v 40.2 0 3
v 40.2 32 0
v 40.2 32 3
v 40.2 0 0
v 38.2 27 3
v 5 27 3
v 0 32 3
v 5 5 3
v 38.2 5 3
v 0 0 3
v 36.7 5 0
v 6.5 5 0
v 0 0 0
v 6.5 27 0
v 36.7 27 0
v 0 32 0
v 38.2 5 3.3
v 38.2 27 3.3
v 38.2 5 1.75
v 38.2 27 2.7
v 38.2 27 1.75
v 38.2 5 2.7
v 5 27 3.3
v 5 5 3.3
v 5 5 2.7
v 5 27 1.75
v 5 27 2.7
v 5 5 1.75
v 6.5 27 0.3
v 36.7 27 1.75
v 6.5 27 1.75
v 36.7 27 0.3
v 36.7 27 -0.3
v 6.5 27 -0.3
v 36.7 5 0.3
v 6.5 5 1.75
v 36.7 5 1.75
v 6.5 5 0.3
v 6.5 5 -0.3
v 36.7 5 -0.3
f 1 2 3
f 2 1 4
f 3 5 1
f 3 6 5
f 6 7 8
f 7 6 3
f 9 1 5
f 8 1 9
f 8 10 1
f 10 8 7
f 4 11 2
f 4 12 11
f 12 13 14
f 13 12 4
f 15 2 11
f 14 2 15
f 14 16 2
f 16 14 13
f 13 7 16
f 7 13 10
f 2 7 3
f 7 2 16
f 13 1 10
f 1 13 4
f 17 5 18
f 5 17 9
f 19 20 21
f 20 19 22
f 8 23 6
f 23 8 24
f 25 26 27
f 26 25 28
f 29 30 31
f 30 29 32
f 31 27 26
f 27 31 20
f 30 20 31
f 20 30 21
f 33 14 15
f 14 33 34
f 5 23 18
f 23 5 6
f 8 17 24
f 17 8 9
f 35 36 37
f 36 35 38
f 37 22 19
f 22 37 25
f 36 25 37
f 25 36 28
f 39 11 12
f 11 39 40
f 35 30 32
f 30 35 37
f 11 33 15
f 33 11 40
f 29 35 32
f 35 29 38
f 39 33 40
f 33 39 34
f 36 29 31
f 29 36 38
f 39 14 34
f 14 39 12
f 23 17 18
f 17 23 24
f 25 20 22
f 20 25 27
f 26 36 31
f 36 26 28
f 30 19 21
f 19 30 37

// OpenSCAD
// LibFile: unfy_popins.scad
//   UnfyOpenSCADLib Copyright Leif Burrow 2026
//   kc8rwr@unfy.us
//   unforgettability.net
//   .
//   This file is part of UnfyOpenSCADLib.
//   .
//   unfy_popins contains modules for creating cutouts and mounts for simple rectangular parts such as switches and panel meters which push into a hole and have fingers that grab. Parts may be selected by name so that the end user may choose a part from a customizer drop-down.

use <../unfy_lists.scad>

//Device 
device="rleil_r2"; //["RLEIL_R2 | RLEIL_R2-Rleil R2 Series Switch", "YB4835VA | Digital Volt/Amp Panel Meter"]
wall = 3;
margin = 5;
support_skin = 0.6;

body_color = "Blue"; //["Lavender", "Thistle", "Plum", "Violet", "Orchid", "Fuchsia", "Magenta", "MediumOrchid", "MediumPurple", "BlueViolet", "DarkViolet", "DarkOrchid", "DarkMagenta", "Purple", "Indigo", "DarkSlateBlue", "SlateBlue", "MediumSlateBlue", "Pink", "LightPink", "HotPink", "DeepPink", "MediumVioletRed", "PaleVioletRed", "Aqua", "Cyan", "LightCyan", "PaleTurquoise", "Aquamarine", "Turquoise", "MediumTurquoise", "DarkTurquoise", "CadetBlue", "SteelBlue", "LightSteelBlue", "PowderBlue", "LightBlue", "SkyBlue", "LightSkyBlue", "DeepSkyBlue", "DodgerBlue", "CornflowerBlue", "RoyalBlue", "Blue", "MediumBlue", "DarkBlue", "Navy", "MidnightBlue", "IndianRed", "LightCoral", "Salmon", "DarkSalmon", "LightSalmon", "Red", "Crimson", "FireBrick", "DarkRed", "GreenYellow", "Chartreuse", "LawnGreen", "Lime", "LimeGreen", "PaleGreen", "LightGreen", "MediumSpringGreen", "SpringGreen", "MediumSeaGreen", "SeaGreen", "ForestGreen", "Green", "DarkGreen", "YellowGreen", "OliveDrab", "Olive", "DarkOliveGreen", "MediumAquamarine", "DarkSeaGreen", "LightSeaGreen", "DarkCyan", "Teal", "LightSalmon", "Coral", "Tomato", "OrangeRed", "DarkOrange", "Orange", "Gold", "Yellow", "LightYellow", "LemonChiffon", "LightGoldenrodYellow", "PapayaWhip", "Moccasin", "PeachPuff", "PaleGoldenrod", "Khaki", "DarkKhaki", "Cornsilk", "BlanchedAlmond", "Bisque", "NavajoWhite", "Wheat", "BurlyWood", "Tan", "RosyBrown", "SandyBrown", "Goldenrod", "DarkGoldenrod", "Peru", "Chocolate", "SaddleBrown", "Sienna", "Brown", "Maroon", "White", "Snow", "Honeydew", "MintCream", "Azure", "AliceBlue", "GhostWhite", "WhiteSmoke", "Seashell", "Beige", "OldLace", "FloralWhite", "Ivory", "AntiqueWhite", "Linen", "LavenderBlush", "MistyRose", "Gainsboro", "LightGrey", "Silver", "DarkGray", "Gray", "DimGray", "LightSlateGray", "SlateGray", "DarkSlateGray", "Black"]
support_color = "Yellow"; //["Lavender", "Thistle", "Plum", "Violet", "Orchid", "Fuchsia", "Magenta", "MediumOrchid", "MediumPurple", "BlueViolet", "DarkViolet", "DarkOrchid", "DarkMagenta", "Purple", "Indigo", "DarkSlateBlue", "SlateBlue", "MediumSlateBlue", "Pink", "LightPink", "HotPink", "DeepPink", "MediumVioletRed", "PaleVioletRed", "Aqua", "Cyan", "LightCyan", "PaleTurquoise", "Aquamarine", "Turquoise", "MediumTurquoise", "DarkTurquoise", "CadetBlue", "SteelBlue", "LightSteelBlue", "PowderBlue", "LightBlue", "SkyBlue", "LightSkyBlue", "DeepSkyBlue", "DodgerBlue", "CornflowerBlue", "RoyalBlue", "Blue", "MediumBlue", "DarkBlue", "Navy", "MidnightBlue", "IndianRed", "LightCoral", "Salmon", "DarkSalmon", "LightSalmon", "Red", "Crimson", "FireBrick", "DarkRed", "GreenYellow", "Chartreuse", "LawnGreen", "Lime", "LimeGreen", "PaleGreen", "LightGreen", "MediumSpringGreen", "SpringGreen", "MediumSeaGreen", "SeaGreen", "ForestGreen", "Green", "DarkGreen", "YellowGreen", "OliveDrab", "Olive", "DarkOliveGreen", "MediumAquamarine", "DarkSeaGreen", "LightSeaGreen", "DarkCyan", "Teal", "LightSalmon", "Coral", "Tomato", "OrangeRed", "DarkOrange", "Orange", "Gold", "Yellow", "LightYellow", "LemonChiffon", "LightGoldenrodYellow", "PapayaWhip", "Moccasin", "PeachPuff", "PaleGoldenrod", "Khaki", "DarkKhaki", "Cornsilk", "BlanchedAlmond", "Bisque", "NavajoWhite", "Wheat", "BurlyWood", "Tan", "RosyBrown", "SandyBrown", "Goldenrod", "DarkGoldenrod", "Peru", "Chocolate", "SaddleBrown", "Sienna", "Brown", "Maroon", "White", "Snow", "Honeydew", "MintCream", "Azure", "AliceBlue", "GhostWhite", "WhiteSmoke", "Seashell", "Beige", "OldLace", "FloralWhite", "Ivory", "AntiqueWhite", "Linen", "LavenderBlush", "MistyRose", "Gainsboro", "LightGrey", "Silver", "DarkGray", "Gray", "DimGray", "LightSlateGray", "SlateGray", "DarkSlateGray", "Black"]


$unf_over = 1;

// Section: Custom Pop-ins
//   Modules for pop-ins of any size. These are used by the named parts below, and may be used directly for parts which are not yet included.

// Module: unf_popinCustomNegative
// Usage:
//   unf_popinCustomNegative(&lt;args&gt;);
// Description:
//   The cutout for a pop-in part of any size. The cutout is the size of the opening plus the ridge on each side, it is partially filled back in by unf_popinCustomPositive().
// Arguments:
//   ---
//   size = [x, y] size of the opening the part pushes through ([10, 5])
//   ridge = [x, y] width of the ledge on each side of the opening which the part's fingers grab ([2, 1])
//   extra = how far beyond the wall to extend the cutout (5)
//   wall = thickness of the panel the part is mounted in (2)
// Figure(Spin;VPD=50;VPT=[7,3.5,3];NoAxes): defaults
//   $unf_over = 1;
//   $fn = 36;
//   use <cutouts/unfy_popins.scad>;
//   unf_popinCustomNegative();
module unf_popinCustomNegative(size=[10, 5], ridge=[2, 1], extra=5, wall=2){
  translate([0, 0, -$unf_over]){
    cube([size.x+(2*ridge.x), size.y+(2*ridge.y), wall + extra + (2*$unf_over)]);
  }
}

// Module: unf_popinCustomPositive
// Usage:
//   unf_popinCustomPositive(&lt;args&gt;);
// Description:
//   The positive part for a pop-in part of any size. This is a ledge around the opening, thin enough for the part's fingers to grab, plus any optional support skin for printing.
// Arguments:
//   ---
//   size = [x, y] size of the opening the part pushes through ([10, 5])
//   catch_thickness = thickness of the ledge which the part's fingers grab (1.2)
//   ridge = [x, y] width of the ledge on each side of the opening which the part's fingers grab ([2, 1])
//   wall = thickness of the panel the part is mounted in (2)
//   body_color = color of the generated part (Blue)
//   support_color = color of generated supports (Yellow)
//   support_skin = thickness of support skin, 0 for none (0)
// Figure(Spin;VPD=50;VPT=[7,3.5,0];NoAxes): defaults
//   $unf_over = 1;
//   $fn = 36;
//   use <cutouts/unfy_popins.scad>;
//   unf_popinCustomPositive();
module unf_popinCustomPositive(size=[10, 5], catch_thickness=1.2, ridge=[2,1], wall=2, body_color="Blue", support_color="Yellow", support_skin=0){
  z_offset = 0 < (wall-catch_thickness) ? wall-catch_thickness : 0;
  if (0 < support_skin){
    color(support_color){
      translate([ridge.x, ridge.y, -support_skin/2]){
	cube([size.x, size.y, support_skin]);
      }
      translate([0, 0, wall-(support_skin/2)]){
	cube([size.x+(2*ridge.x), size.y+(2*ridge.y), support_skin]);
      }
    }
  }
  color(body_color){
    difference(){
      cube([size.x+(2*ridge.x), size.y+(2*ridge.y), catch_thickness]);
      translate([ridge.x, ridge.y, -$unf_over]){
	cube([size.x, size.y, catch_thickness+(2*$unf_over)]);
      }
    }
  }
}


// Section: Pop-ins by Name

// Module: unf_popinPositive
// Usage:
//   unf_popinPositive(device, &lt;args&gt;);
// Description:
//   Call a popin switch module by name.
// Arguments:
//   device = name of the part, "RLEIL_R2" or "YB4835VA", case insensitive. Anything after a "|" is ignored, so a description may be included for display in a customizer drop-down.
//   ---
//   wall = thickness of the panel the part is mounted in (2)
//   body_color = color of the generated part (Blue)
//   support_color = color of generated supports (Yellow)
//   support_skin = thickness of support skin, 0 for none (0)
// Figure(Spin;VPD=80;VPT=[17,11,0];NoAxes): device="RLEIL_R2"
//   $unf_over = 1;
//   $fn = 36;
//   use <cutouts/unfy_popins.scad>;
//   unf_popinPositive(device="RLEIL_R2");
module unf_popinPositive(device, wall=2, body_color="Blue", support_color="Yellow", support_skin=0){
  let(device = unf_stToLower(unf_stCutAfter(device, "|"))){
    if ("rleil_r2" == device){
      unf_rleilRl2Popin(wall=wall, body_color=body_color, support_color=support_color, support_skin=support_skin);
    } else if ("yb4835va" == device){
      unf_yb4835vaPopin(wall=wall, body_color=body_color, support_color=support_color, support_skin=support_skin);
    }
  }
}

// Module: unf_popinNegative
// Usage:
//   unf_popinNegative(device, &lt;args&gt;);
// Description:
//   Call a popin switch cutout module by name.
// Arguments:
//   device = name of the part, "RLEIL_R2" or "YB4835VA", case insensitive. Anything after a "|" is ignored.
//   ---
//   wall = thickness of the panel the part is mounted in (2)
// Figure(Spin;VPD=80;VPT=[17,11,3];NoAxes): device="RLEIL_R2"
//   $unf_over = 1;
//   $fn = 36;
//   use <cutouts/unfy_popins.scad>;
//   unf_popinNegative(device="RLEIL_R2");
module unf_popinNegative(device, wall=2){
  let(device = unf_stToLower(unf_stCutAfter(device, "|"))){
    if ("rleil_r2" == device){
      unf_rleilRl2Cutout(wall);
    } else if ("yb4835va" == device){
      unf_yb4835vaCutout(wall);
    }
  }
}

// Function: unf_popinDims
// Synopsis: Pop-in Dimensions by Name
// Description:
//   Get a popin switch's dimensions by name. Returns [0, 0] for an unknown part.
// Usage:
//   unf_popinDims(device)
// Arguments:
//   device = name of the part, "RLEIL_R2" or "YB4835VA", case insensitive. Anything after a "|" is ignored.
function unf_popinDims(device) =
  let(device = unf_stToLower(unf_stCutAfter(device, "|"))) (
    "rleil_r2" == device ? unf_rleilR2Dims() : (
      "yb4835va" == device ? unf_yb4835vaDims() : [0, 0]
    )
  );

// Module: unf_popin
// Usage:
//   unf_popin(&lt;args&gt;){<br/>&nbsp;&nbsp;&nbsp;child_stuff();<br/>}
// Description:
//   Operator module that uses unf_popinPositive() and unf_popinNegative() to cut out and build up a popin by name on the child object(s).
// Arguments:
//   ---
//   location = where to place the pop-in relative to the child/childrens' origin ([0, 0, 0])
//   rotation = how to orientate the pop-in relative to the child/children objects (0)
//   device = name of the part, "RLEIL_R2" or "YB4835VA", case insensitive. Anything after a "|" is ignored. (rleil_r2)
//   wall = thickness of the panel the part is mounted in (2)
//   body_color = color of the generated part (Blue)
//   support_color = color of generated supports (Yellow)
//   support_skin = thickness of support skin, 0 for none (0)
//   do_render = wrap the positive and negative parts in render(), which may speed up previews of complex models (false)
// Figure(Spin;VPD=120;VPT=[20,16,0];NoAxes): device="RLEIL_R2"
//   $unf_over = 1;
//   $fn = 36;
//   use <cutouts/unfy_popins.scad>;
//   unf_popin(location=[5, 5, 0], device="RLEIL_R2", wall=3){
//     color("Blue") cube([43.2, 32, 3]);
//   }
module unf_popin(location=[0, 0, 0], rotation=0, device="rleil_r2", wall=2, body_color="Blue", support_color="Yellow", support_skin=0, do_render=false){
  difference(){
    children();
    translate(location){
      rotate(rotation){
	if (do_render){
	  render() unf_popinNegative(device=device, wall=wall);
	} else {
	  unf_popinNegative(device=device, wall=wall);
	}
      }
    }
  }
  translate(location){
    rotate(rotation){
      if (do_render){
	render() unf_popinPositive(device=device, wall=wall, body_color=body_color, support_color=support_color, support_skin=support_skin);
      } else {
	unf_popinPositive(device=device, wall=wall, body_color=body_color, support_color=support_color, support_skin=support_skin);
      }
    }
  }

}

//**********************Switches****************************

// Section: Switches

// Module: unf_rleilRl2Popin
// Usage:
//   unf_rleilRl2Popin(&lt;args&gt;);
// Description:
//   The positive part for a RLEIL RL2 series Rocker Switch.
// Arguments:
//   ---
//   wall = thickness of the panel the switch is mounted in (2)
//   body_color = color of the generated part (Blue)
//   support_color = color of generated supports (Yellow)
//   support_skin = thickness of support skin, 0 for none (0)
module unf_rleilRl2Popin(wall=2, body_color="Blue", support_color="Yellow", support_skin=0){
  unf_popinCustomPositive(size=[30.2, 22], catch_thickness=1.75, ridge=[1.5, 0], wall=wall, body_color=body_color, support_color=support_color, support_skin=support_skin);
}

// Module: unf_rleilRl2Cutout
// Usage:
//   unf_rleilRl2Cutout(&lt;args&gt;);
// Description:
//   The cutout for a RLEIL RL2 series Rocker Switch.
// Arguments:
//   wall = thickness of the panel the switch is mounted in (2)
module unf_rleilRl2Cutout(wall=2){
  unf_popinCustomNegative(size=[30.2, 22], ridge=[1.5, 0], wall=wall);
}

// Function: unf_rleilR2Dims
// Synopsis: RLEIL RL2 Dimensions
// Description:
//   Returns the [x, y, z] dimensions of a RLEIL RL2 series Rocker Switch.
// Usage:
//   unf_rleilR2Dims()
function unf_rleilR2Dims() = [30.2, 22, 27];//[33, 25, 27];

//********************End Switches**************************


//********************Random Items**************************

// Section: Meters

// Module: unf_yb4835vaCutout
// Usage:
//   unf_yb4835vaCutout(&lt;args&gt;);
// Description:
//   The cutout for a YB4835VA Digital Volt/Amp Panel Meter.
// Arguments:
//   wall = thickness of the panel the meter is mounted in (2)
module unf_yb4835vaCutout(wall=2){
  unf_popinCustomNegative(size=[66, 37], wall=wall, ridge=[3, 0]);
}

// Module: unf_yb4835vaPopin
// Usage:
//   unf_yb4835vaPopin(&lt;args&gt;);
// Description:
//   The positive part for a YB4835VA Digital Volt/Amp Panel Meter.
// Arguments:
//   ---
//   wall = thickness of the panel the meter is mounted in (2)
//   body_color = color of the generated part (Blue)
//   support_color = color of generated supports (Yellow)
//   support_skin = thickness of support skin, 0 for none (0)
module unf_yb4835vaPopin(wall=2, body_color="Blue", support_color="Yellow", support_skin=0){
  unf_popinCustomPositive(size=[66, 37], wall=wall, ridge=[3, 0], body_color=body_color, support_color=support_color, support_skin=support_skin);
}

// Function: unf_yb4835vaDims
// Synopsis: YB4835VA Dimensions
// Description:
//   Returns the [x, y] dimensions of a YB4835VA Digital Volt/Amp Panel Meter.
// Usage:
//   unf_yb4835vaDims()
function unf_yb4835vaDims() = [70, 40];

//******************End Random Items************************


panel_dim = unf_popinDims(device=device);
unf_popin(location=[margin, margin, 0], rotation=0, device=device, wall=wall, body_color=body_color, support_color=support_color, support_skin=support_skin){
  color(body_color){
    cube([panel_dim.x + (2*margin), panel_dim.y + (2*margin), wall]);
  }
}

// Section: Licensing
//   UnfyOpenSCADLib is free software: you can redistribute it and/or modify it under the terms of the
//   GNU General Public License as published by the Free Software Foundation, either version 3 of
//   the License, or (at your option) any later version.
//   .
//   UnfyOpenSCADLib is distributed in the hope that it will be useful, but WITHOUT ANY WARRANTY;
//   without even the implied warranty of MERCHANTABILITY or FITNESS FOR A PARTICULAR PURPOSE.
//   See the GNU General Public License for more details.
//   .
//   You should have received a copy of the GNU General Public License along with UnfyOpenSCADLib.
//   If not, see <https://www.gnu.org/licenses/>.
//   
